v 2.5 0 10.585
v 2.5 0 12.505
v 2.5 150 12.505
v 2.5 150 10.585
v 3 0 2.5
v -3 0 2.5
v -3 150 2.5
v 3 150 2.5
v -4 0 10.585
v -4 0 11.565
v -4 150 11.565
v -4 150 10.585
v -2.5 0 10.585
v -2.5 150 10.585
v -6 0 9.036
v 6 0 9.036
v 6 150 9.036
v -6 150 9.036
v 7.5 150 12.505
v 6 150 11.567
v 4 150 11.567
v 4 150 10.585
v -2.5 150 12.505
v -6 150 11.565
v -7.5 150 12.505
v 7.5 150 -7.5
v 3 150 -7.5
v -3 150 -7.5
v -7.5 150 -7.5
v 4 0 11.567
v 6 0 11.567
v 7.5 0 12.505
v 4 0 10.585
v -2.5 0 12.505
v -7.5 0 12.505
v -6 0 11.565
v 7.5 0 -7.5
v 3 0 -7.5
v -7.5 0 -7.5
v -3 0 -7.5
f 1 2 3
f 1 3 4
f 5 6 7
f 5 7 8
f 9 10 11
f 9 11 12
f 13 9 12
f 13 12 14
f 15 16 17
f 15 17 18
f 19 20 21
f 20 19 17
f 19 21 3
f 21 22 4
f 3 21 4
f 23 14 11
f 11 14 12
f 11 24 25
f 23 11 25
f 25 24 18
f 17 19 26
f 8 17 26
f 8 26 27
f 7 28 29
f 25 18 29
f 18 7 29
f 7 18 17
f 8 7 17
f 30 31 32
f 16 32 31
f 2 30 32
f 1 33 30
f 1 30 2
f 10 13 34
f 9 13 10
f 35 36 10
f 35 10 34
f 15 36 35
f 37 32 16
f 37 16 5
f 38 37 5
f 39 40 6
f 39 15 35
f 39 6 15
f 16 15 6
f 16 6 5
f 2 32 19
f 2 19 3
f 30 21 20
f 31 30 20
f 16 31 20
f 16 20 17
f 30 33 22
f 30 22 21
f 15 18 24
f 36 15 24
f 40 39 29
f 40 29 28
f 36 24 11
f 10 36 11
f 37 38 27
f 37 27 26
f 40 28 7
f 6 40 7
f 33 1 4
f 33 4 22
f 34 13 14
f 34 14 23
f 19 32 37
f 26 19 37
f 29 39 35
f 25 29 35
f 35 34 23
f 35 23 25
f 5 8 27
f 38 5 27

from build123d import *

# Parameters (mm, degrees)
RESSALTO_EXTRUS_O1_DEPTH = 150


with BuildPart() as part:
    # Esboço1 → Ressalto-extrusão1 (new body)
    with BuildSketch(Plane(origin=(0, 0, 0), x_dir=(1, 0, 0), z_dir=(0, 1, 0))):
        Polygon((3, 7.5), (7.5, 7.5), (7.5, -7.5), (7.5, -12.5047377), (2.5, -12.5047377), (2.5, -10.5847377), (4, -10.5847377), (4, -11.566741313), (6, -11.566741313), (6, -9.036092961), (-6, -9.036092961), (-6, -11.5647377), (-4, -11.5647377), (-4, -10.585059624), (-2.5, -10.585059624), (-2.5, -12.5047377), (-7.5, -12.5047377), (-7.5, -7.5), (-7.5, 7.5), (-3, 7.5), (-3, -2.5), (3, -2.5), align=None)
    extrude(amount=RESSALTO_EXTRUS_O1_DEPTH)


solid = part.part
